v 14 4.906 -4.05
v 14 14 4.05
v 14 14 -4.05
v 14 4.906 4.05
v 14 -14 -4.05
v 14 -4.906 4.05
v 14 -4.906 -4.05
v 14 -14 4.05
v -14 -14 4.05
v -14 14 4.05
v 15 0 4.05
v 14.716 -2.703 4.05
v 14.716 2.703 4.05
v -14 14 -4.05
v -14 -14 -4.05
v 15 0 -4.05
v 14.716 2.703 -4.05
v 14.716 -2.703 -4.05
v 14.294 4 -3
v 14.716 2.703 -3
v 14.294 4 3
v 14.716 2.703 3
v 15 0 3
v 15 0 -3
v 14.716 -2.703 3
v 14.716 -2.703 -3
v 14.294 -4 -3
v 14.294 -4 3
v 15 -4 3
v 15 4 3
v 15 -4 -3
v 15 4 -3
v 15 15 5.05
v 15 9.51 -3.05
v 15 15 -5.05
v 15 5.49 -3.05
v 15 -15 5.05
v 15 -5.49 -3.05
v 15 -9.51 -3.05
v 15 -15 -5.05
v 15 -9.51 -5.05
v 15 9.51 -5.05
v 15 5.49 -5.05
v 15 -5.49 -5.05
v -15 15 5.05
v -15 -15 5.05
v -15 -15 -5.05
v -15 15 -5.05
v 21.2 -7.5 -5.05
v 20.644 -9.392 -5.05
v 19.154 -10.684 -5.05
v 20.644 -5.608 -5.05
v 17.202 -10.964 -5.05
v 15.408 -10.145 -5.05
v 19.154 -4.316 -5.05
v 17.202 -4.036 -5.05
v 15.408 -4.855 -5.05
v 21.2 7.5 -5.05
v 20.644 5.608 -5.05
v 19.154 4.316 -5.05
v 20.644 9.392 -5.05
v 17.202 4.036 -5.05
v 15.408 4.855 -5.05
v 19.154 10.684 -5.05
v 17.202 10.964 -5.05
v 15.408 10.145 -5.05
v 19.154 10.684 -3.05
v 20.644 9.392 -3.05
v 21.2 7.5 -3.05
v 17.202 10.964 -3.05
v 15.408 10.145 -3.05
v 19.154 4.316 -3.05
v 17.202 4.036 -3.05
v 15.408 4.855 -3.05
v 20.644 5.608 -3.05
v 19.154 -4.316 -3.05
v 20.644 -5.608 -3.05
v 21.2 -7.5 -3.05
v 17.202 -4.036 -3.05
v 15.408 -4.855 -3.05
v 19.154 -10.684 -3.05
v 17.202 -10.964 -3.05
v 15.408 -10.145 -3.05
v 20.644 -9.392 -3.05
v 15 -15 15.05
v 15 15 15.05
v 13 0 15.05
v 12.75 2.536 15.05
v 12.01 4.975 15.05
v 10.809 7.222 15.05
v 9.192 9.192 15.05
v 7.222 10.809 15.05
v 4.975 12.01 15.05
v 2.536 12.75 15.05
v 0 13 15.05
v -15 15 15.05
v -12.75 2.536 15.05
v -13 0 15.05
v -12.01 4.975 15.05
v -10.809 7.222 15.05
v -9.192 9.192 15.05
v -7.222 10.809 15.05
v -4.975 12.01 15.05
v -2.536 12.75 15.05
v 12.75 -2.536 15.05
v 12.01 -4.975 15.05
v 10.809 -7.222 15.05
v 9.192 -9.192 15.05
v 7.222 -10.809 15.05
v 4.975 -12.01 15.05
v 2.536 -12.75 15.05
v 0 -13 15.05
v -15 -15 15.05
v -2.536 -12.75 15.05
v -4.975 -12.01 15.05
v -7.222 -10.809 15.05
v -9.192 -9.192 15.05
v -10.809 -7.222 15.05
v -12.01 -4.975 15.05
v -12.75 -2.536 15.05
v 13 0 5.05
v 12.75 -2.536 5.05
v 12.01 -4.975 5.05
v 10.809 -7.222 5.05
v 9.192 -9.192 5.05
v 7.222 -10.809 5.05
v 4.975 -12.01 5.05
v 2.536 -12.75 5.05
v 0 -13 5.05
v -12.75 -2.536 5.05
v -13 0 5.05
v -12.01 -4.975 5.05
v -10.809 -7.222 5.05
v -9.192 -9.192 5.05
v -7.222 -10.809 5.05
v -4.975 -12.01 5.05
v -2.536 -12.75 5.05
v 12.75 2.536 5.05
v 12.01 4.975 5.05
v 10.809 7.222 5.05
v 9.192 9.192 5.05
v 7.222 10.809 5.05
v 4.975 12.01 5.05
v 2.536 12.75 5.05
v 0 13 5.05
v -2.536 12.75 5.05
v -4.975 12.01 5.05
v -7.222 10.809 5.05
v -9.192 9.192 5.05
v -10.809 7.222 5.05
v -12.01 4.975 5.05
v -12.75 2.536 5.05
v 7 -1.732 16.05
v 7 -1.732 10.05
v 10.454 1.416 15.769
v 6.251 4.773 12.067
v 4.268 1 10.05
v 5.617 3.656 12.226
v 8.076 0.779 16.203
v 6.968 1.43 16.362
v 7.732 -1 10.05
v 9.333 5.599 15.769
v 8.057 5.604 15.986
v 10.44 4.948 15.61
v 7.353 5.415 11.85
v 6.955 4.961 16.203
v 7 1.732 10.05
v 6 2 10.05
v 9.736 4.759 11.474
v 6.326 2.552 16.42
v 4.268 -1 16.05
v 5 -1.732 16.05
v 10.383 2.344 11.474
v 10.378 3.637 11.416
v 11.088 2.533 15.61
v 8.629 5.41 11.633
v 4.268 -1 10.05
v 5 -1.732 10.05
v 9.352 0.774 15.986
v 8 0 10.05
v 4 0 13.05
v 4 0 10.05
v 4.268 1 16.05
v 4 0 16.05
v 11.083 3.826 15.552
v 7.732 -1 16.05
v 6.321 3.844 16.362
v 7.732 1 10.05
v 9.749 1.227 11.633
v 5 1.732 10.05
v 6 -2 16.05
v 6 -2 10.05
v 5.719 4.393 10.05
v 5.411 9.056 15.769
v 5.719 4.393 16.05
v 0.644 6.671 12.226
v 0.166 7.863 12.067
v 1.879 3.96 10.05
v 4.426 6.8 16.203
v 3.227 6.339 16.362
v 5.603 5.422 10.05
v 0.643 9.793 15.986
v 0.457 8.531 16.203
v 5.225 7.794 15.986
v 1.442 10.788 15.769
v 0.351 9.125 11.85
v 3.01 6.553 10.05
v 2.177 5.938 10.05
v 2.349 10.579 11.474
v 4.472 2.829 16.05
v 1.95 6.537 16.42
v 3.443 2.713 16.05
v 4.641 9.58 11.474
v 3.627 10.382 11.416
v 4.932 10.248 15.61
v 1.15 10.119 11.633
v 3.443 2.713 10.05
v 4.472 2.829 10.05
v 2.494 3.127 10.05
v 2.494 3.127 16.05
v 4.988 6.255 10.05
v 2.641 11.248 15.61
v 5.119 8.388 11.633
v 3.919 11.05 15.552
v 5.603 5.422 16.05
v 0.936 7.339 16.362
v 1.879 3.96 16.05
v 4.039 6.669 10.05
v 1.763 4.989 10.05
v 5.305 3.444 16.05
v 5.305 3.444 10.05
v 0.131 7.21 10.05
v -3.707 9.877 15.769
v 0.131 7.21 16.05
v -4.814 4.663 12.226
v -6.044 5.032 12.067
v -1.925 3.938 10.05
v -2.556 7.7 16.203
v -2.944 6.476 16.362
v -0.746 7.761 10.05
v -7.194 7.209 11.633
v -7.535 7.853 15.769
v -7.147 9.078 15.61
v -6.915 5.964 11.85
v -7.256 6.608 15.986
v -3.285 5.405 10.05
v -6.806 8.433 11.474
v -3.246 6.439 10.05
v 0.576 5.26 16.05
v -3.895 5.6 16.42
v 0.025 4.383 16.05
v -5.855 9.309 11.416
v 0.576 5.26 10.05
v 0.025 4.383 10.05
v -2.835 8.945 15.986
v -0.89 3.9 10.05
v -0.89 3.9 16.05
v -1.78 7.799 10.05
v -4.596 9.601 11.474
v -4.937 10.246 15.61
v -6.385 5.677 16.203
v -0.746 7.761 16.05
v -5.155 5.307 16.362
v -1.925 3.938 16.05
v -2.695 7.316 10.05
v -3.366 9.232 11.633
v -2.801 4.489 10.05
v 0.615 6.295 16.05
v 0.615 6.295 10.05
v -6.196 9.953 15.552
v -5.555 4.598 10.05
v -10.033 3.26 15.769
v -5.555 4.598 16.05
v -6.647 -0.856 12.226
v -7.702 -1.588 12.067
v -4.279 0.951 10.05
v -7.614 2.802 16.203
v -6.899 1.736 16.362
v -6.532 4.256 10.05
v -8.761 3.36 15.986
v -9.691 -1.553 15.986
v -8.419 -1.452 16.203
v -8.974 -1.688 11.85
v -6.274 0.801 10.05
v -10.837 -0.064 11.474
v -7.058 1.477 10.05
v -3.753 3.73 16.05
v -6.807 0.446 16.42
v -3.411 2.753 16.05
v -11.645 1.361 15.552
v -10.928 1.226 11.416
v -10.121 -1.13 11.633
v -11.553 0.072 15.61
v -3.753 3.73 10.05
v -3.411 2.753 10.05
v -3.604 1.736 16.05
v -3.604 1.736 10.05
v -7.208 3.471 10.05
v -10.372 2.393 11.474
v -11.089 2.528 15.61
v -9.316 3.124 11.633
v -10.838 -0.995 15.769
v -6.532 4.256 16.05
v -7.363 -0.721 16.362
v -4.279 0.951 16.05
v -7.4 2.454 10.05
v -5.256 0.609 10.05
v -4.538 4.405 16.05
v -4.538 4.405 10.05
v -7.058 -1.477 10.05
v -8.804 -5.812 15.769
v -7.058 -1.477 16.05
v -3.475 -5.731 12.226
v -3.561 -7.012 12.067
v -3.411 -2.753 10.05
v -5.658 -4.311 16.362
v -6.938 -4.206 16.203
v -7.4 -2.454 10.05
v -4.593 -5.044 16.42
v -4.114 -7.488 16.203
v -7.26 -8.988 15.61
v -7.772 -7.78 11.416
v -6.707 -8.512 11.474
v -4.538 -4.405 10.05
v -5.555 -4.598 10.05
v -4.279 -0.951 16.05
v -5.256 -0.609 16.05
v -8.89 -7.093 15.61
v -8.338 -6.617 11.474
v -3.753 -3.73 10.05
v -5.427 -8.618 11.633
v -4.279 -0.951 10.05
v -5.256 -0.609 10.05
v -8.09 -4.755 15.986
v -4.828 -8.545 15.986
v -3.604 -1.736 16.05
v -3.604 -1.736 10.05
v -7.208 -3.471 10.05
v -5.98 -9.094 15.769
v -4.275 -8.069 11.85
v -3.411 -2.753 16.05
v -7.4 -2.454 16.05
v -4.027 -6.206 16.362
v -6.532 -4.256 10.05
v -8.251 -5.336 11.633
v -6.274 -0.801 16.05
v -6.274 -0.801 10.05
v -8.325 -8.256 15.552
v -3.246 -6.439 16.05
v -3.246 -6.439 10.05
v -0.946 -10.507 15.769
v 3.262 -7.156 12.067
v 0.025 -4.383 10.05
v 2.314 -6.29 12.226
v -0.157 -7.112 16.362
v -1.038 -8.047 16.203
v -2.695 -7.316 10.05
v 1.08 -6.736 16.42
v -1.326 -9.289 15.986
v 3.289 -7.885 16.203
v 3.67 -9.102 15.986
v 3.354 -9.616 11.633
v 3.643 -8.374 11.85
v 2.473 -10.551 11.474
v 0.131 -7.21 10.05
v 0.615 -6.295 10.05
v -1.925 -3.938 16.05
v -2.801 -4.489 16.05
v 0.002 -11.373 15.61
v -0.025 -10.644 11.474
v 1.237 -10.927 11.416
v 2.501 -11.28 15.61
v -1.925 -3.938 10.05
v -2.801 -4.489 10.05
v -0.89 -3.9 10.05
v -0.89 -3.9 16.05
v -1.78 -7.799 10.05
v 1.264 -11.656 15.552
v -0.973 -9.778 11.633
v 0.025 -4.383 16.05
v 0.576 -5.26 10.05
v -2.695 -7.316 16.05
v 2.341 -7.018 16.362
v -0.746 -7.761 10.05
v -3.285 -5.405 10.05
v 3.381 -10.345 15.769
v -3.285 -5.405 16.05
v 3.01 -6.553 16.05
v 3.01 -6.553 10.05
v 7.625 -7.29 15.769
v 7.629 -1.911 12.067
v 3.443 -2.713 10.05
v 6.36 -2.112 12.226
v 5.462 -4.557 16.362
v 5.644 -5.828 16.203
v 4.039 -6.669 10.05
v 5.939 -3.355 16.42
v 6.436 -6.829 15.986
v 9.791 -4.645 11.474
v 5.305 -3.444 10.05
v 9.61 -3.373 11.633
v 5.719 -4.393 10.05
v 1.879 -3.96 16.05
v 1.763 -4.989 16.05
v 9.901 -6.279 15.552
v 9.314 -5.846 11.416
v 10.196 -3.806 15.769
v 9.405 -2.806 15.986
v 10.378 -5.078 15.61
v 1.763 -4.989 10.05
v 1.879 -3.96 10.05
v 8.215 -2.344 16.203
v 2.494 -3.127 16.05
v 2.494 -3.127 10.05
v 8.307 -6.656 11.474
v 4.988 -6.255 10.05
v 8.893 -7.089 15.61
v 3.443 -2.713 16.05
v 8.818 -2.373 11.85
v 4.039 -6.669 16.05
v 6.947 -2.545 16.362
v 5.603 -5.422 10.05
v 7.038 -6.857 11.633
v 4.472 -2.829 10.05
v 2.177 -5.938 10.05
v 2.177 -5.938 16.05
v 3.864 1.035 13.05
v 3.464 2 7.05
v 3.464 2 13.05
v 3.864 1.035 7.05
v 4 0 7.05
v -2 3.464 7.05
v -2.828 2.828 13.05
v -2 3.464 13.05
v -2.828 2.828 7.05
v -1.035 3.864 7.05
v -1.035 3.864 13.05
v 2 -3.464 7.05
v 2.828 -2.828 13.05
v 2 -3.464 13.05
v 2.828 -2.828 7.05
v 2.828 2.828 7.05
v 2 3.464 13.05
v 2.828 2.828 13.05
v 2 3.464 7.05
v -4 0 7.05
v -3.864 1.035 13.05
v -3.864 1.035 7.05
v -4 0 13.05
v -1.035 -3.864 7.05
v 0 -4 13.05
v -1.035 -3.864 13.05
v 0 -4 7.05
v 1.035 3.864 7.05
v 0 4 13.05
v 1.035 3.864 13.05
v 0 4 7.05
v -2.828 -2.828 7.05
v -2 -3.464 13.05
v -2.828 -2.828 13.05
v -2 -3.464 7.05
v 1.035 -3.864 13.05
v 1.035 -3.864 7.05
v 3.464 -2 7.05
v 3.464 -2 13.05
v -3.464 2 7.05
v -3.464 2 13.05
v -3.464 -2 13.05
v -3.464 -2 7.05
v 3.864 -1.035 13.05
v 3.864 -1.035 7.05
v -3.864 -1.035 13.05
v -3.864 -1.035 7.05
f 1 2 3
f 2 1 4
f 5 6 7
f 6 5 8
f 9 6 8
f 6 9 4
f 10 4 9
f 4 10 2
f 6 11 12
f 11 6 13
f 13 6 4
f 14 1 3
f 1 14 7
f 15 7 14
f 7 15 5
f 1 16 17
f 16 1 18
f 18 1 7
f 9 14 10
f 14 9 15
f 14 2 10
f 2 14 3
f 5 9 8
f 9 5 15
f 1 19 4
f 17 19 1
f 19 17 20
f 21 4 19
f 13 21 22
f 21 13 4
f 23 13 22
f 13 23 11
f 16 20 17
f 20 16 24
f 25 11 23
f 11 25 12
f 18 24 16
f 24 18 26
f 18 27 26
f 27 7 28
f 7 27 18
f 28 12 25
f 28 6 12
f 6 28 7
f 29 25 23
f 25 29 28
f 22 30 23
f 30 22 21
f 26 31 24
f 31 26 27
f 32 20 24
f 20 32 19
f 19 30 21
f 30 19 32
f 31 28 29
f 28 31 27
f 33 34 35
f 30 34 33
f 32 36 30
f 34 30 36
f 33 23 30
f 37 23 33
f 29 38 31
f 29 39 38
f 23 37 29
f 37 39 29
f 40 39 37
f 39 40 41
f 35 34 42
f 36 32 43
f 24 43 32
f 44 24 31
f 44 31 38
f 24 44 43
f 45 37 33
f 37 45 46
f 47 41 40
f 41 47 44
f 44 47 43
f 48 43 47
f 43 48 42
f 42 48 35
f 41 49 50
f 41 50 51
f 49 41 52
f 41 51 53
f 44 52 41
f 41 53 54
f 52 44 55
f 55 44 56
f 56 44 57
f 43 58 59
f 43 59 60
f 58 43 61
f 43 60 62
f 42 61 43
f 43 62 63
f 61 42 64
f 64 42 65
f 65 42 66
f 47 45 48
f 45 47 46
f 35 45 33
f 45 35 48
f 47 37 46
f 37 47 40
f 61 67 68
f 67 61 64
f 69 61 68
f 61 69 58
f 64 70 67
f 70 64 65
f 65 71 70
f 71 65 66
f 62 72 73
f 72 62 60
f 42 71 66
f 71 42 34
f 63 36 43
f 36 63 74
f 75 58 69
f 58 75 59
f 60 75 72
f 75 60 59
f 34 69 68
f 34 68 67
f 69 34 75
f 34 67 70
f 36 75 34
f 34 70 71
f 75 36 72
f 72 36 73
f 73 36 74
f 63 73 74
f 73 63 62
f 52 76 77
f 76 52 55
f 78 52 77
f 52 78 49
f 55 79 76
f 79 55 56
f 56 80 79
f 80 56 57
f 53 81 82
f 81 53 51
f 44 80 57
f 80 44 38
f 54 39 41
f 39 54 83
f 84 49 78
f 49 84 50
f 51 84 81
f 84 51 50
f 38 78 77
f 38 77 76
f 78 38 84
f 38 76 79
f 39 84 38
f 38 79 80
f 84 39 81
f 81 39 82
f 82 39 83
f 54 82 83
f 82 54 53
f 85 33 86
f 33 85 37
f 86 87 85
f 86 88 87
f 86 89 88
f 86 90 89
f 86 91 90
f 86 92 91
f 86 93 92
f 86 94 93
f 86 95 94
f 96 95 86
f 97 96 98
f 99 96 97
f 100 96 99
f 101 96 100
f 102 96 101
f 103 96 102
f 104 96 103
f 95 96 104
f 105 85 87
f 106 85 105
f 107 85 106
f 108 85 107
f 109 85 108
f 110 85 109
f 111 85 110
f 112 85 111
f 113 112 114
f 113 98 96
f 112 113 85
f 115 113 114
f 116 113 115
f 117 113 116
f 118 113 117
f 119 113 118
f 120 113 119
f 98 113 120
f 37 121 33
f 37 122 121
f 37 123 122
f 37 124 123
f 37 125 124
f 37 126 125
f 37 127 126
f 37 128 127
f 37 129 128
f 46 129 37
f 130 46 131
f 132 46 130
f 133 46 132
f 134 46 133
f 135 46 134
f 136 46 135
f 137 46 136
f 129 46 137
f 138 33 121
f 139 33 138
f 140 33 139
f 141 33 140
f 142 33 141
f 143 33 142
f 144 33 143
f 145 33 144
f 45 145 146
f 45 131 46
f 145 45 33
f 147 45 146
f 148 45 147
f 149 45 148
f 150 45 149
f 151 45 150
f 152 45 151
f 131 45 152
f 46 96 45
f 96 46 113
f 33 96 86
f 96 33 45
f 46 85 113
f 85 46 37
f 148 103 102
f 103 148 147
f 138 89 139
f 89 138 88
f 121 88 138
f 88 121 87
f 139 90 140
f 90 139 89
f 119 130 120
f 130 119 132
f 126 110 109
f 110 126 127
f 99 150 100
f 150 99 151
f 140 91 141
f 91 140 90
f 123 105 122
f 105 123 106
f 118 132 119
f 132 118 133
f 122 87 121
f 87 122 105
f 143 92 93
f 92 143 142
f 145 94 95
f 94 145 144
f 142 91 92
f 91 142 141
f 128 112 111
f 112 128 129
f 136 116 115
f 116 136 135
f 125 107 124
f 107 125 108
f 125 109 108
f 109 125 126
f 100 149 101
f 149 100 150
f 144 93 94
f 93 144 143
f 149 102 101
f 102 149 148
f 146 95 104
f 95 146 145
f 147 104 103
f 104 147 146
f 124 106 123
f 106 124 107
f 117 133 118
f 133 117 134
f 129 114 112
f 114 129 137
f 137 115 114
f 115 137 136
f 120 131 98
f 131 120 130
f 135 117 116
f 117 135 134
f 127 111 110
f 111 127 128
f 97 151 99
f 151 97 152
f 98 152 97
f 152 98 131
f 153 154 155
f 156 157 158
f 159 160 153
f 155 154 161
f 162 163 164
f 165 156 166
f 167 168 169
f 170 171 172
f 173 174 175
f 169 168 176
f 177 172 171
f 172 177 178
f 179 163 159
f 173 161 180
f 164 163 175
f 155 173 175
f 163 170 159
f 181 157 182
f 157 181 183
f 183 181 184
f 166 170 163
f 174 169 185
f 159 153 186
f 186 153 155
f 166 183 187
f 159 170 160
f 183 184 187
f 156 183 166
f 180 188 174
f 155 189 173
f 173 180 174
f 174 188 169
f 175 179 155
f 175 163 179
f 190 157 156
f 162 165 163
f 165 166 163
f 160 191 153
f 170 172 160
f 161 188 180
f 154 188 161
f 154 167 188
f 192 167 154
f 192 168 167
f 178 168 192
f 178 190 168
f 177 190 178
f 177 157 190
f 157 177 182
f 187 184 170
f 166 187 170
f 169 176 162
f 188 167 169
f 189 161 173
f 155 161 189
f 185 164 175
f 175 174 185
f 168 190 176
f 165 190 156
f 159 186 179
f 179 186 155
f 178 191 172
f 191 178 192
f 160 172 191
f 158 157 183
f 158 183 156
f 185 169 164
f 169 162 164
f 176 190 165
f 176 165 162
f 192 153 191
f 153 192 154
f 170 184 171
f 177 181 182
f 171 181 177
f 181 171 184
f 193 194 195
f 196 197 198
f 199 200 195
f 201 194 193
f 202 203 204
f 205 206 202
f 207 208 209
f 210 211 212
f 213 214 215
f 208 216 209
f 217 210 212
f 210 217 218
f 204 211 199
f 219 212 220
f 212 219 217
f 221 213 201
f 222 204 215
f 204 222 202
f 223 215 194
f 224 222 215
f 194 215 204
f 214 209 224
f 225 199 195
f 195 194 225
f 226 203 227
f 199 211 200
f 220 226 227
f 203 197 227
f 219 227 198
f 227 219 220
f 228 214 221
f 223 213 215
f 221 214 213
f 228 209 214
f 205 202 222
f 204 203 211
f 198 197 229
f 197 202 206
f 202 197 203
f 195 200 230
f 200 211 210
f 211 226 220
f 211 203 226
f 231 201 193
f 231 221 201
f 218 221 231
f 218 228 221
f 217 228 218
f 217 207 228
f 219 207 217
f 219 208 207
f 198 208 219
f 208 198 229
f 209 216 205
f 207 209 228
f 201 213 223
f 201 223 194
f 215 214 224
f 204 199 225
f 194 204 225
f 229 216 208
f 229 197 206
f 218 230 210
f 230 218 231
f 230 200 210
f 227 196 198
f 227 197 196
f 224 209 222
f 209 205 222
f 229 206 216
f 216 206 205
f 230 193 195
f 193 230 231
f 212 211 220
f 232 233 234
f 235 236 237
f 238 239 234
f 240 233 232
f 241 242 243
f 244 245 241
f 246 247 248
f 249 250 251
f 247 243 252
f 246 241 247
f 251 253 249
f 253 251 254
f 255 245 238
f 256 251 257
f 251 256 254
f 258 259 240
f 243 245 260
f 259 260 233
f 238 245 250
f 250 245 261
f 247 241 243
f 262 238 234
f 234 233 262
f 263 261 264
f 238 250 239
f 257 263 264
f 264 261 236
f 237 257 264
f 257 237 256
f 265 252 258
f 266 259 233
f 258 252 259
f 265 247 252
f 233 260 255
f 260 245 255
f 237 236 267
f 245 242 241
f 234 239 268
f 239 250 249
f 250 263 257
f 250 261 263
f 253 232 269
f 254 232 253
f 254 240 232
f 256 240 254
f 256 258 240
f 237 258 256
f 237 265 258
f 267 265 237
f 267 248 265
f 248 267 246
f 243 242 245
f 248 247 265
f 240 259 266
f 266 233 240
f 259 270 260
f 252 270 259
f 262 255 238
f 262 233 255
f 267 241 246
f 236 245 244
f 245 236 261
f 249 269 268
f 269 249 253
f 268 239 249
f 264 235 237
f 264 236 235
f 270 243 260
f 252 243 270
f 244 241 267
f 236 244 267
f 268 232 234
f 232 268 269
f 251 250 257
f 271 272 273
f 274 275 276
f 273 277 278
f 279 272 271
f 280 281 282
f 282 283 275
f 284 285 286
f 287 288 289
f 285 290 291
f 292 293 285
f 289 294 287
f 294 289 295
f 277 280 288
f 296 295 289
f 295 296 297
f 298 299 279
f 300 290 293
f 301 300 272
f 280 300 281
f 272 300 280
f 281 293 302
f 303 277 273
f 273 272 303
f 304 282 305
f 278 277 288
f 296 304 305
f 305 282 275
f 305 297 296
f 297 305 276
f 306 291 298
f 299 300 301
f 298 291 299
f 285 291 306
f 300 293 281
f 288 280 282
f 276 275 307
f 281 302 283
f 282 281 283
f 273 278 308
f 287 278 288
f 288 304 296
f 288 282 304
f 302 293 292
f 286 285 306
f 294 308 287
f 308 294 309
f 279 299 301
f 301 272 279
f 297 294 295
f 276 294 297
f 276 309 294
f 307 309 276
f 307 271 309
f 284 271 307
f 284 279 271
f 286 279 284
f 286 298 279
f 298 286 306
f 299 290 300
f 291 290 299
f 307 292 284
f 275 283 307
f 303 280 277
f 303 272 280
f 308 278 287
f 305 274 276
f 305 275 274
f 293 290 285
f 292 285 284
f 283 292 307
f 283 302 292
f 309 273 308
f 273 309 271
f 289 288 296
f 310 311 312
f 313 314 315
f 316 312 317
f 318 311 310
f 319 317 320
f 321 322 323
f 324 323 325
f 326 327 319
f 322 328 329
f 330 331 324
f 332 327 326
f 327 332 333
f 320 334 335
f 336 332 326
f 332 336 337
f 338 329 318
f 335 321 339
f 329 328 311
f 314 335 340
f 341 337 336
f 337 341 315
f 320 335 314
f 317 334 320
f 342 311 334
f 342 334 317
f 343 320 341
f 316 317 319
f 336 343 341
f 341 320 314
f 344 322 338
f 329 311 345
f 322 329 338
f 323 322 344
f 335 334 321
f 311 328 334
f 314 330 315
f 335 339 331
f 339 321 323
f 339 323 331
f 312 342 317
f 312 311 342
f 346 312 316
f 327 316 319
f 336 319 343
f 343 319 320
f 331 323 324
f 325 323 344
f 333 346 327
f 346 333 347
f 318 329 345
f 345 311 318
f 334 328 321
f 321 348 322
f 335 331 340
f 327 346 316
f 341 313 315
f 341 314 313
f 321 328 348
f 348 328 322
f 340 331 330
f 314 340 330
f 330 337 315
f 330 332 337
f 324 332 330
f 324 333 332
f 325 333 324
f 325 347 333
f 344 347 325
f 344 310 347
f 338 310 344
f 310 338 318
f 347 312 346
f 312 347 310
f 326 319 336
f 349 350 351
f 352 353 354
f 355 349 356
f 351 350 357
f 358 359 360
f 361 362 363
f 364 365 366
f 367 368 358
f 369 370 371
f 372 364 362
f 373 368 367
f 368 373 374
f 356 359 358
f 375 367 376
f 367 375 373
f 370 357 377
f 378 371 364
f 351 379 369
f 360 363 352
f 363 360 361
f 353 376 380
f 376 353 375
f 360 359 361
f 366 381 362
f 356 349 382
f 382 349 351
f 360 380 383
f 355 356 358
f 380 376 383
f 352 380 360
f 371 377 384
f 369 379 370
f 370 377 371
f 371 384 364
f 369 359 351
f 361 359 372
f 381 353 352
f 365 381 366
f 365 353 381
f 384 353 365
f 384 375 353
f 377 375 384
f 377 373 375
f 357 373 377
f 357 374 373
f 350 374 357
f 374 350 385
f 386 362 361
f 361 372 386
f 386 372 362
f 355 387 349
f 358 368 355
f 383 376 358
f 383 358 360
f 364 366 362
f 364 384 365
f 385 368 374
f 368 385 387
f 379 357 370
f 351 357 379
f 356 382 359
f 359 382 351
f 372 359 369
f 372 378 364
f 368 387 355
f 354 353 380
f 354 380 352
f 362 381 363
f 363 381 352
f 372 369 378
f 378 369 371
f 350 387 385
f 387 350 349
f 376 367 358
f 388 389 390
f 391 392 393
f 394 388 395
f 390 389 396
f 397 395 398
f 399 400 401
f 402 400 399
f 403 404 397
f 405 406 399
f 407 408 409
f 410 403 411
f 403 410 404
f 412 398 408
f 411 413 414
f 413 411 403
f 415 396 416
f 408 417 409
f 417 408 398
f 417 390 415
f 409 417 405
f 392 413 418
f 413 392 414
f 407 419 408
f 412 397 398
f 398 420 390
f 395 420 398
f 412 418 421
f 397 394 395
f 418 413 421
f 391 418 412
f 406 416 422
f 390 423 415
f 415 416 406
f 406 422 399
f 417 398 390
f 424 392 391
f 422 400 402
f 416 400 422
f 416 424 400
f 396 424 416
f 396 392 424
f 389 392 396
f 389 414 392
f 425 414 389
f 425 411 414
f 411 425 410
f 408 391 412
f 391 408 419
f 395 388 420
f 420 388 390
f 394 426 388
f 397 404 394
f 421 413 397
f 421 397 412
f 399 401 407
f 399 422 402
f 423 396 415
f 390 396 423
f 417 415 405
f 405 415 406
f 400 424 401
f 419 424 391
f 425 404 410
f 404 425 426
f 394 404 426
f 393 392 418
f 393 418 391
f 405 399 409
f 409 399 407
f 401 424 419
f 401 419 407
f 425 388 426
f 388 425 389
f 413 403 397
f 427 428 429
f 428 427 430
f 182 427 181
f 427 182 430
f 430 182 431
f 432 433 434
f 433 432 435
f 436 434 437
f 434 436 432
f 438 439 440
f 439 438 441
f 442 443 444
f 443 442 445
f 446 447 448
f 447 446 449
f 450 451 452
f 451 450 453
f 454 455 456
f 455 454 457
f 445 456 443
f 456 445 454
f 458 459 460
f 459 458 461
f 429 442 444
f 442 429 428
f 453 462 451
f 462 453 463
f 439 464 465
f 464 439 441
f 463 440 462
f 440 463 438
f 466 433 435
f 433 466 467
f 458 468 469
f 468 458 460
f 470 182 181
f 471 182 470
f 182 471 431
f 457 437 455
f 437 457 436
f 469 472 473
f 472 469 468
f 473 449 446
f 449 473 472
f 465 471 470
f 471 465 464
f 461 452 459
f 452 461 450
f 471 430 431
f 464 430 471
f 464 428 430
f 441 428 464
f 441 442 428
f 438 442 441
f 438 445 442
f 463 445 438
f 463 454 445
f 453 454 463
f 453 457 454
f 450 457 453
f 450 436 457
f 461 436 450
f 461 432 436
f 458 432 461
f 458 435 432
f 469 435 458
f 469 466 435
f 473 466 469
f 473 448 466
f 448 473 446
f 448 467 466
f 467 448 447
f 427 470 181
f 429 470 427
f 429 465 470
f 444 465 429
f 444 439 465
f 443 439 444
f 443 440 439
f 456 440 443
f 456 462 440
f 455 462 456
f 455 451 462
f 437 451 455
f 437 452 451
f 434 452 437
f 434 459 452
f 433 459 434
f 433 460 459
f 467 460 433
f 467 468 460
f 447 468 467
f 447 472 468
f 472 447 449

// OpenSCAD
// Parameters
overall_length = 30.0; //[15.0:60.0:0.1]
overall_width = 30.0; //[15.0:60.0:0.1]
overall_depth = 10.1; //[5.0:20.2:0.1]
wall_thickness = 1.0; //[0.6:2.0:0.1]
top_thickness = 1.0; //[0.6:2.0:0.1]
base_thickness = 1.0; //[0.6:2.0:0.1]
clearance_overlap = 0.8; //[0.5:2.0:0.1]
impeller_hub_diameter = 8.0; //[4.0:16.0:0.1]
impeller_hub_height = 6.0; //[3.0:12.0:0.1]
impeller_blade_count = 25; //[10:40:1]
impeller_blade_thickness = 0.75; //[0.4:1.5:0.05]
impeller_twist_deg = -30.0; //[-60.0:60.0:1.0]
mount_hole_count = 2; //[2:4:1]
mount_hole_diameter = 3.0; //[2.0:5.0:0.1]
outlet_height = 6.0; //[3.0:9.0:0.1]
outlet_width = 8.0; //[4.0:14.0:0.1]
outlet_length = 8.0; //[4.0:16.0:0.1]
inlet_bore_diameter = 10.0; //[6.0:18.0:0.1]
impeller_cavity_diameter = 22.0; //[16.0:26.0:0.1]
volute_outer_diameter = 26.0; //[20.0:28.0:0.1]
volute_offset_x = 2.0; //[0.0:5.0:0.1]
lug_diameter = 7.0; //[5.0:12.0:0.1]
lug_thickness = 2.0; //[1.2:4.0:0.1]

// Blower module
module blower() {
  color([0.12, 0.12, 0.14]) {
    difference() {
      // Outer casing
      translate([0, 0, 0])
        cube([overall_length, overall_width, overall_depth], center=true);
      // Inner voids
      union() {
        translate([0, 0, (base_thickness - top_thickness) / 2])
          cube([overall_length - 2 * wall_thickness, overall_width - 2 * wall_thickness, overall_depth - top_thickness - base_thickness], center=true);
        translate([0, 0, (base_thickness - top_thickness) / 2])
          cylinder(h=overall_depth - top_thickness - base_thickness + 2 * clearance_overlap, r=impeller_cavity_diameter / 2, center=true);
        translate([volute_offset_x, 0, (base_thickness - top_thickness) / 2])
          cylinder(h=overall_depth - top_thickness - base_thickness + 2 * clearance_overlap, r=volute_outer_diameter / 2, center=true);
        translate([overall_length / 2 + (outlet_length + clearance_overlap) / 2 - clearance_overlap, 0, 0])
          cube([outlet_length + clearance_overlap, outlet_width, outlet_height], center=true);
        translate([overall_length / 2 - wall_thickness / 2, 0, 0])
          cube([wall_thickness + 2 * clearance_overlap, outlet_width, outlet_height], center=true);
      }
    }
    // Top cover
    translate([0, 0, overall_depth / 2 - top_thickness / 2])
      cube([overall_length, overall_width, top_thickness], center=true);
    // Base plate
    translate([0, 0, -overall_depth / 2 + base_thickness / 2])
      cube([overall_length, overall_width, base_thickness], center=true);
    // Screw lugs
    translate([overall_length / 2 + lug_diameter / 2 - clearance_overlap, overall_width / 4, -overall_depth / 2 + lug_thickness / 2])
      cylinder(h=lug_thickness, r=lug_diameter / 2, center=true);
    translate([overall_length / 2 + lug_diameter / 2 - clearance_overlap, -overall_width / 4, -overall_depth / 2 + lug_thickness / 2])
      cylinder(h=lug_thickness, r=lug_diameter / 2, center=true);
  }
}

// Fan module
module fan() {
  color([0.15, 0.15, 0.17]) {
    // Frame
    difference() {
      cube([overall_length, overall_width, 10], center=true);
      cylinder(d=overall_length - 4, h=12, center=true, $fn=32);
    }
    // Hub
    cylinder(d=impeller_hub_diameter, h=impeller_hub_height, center=true, $fn=24);
    // Blades
    for (i = [0:6]) {
      rotate([0, 0, i * 360 / 7])
        hull() {
          translate([impeller_hub_diameter / 2 + 2, 0, 0])
            cylinder(r=2, h=impeller_hub_height, $fn=12);
          translate([impeller_cavity_diameter / 2 - 3, 3, impeller_hub_height * 0.3])
            rotate([0, 10, 15])
            cylinder(r=2.5, h=impeller_hub_height * 0.7, $fn=12);
        }
    }
  }
}

// Blower Fan module
module blower_fan() {
  blower();
  translate([0, 0, overall_depth / 2 + 5])
    fan();
}

// Assembly module
module assembly() {
  blower_fan();
}

assembly();
